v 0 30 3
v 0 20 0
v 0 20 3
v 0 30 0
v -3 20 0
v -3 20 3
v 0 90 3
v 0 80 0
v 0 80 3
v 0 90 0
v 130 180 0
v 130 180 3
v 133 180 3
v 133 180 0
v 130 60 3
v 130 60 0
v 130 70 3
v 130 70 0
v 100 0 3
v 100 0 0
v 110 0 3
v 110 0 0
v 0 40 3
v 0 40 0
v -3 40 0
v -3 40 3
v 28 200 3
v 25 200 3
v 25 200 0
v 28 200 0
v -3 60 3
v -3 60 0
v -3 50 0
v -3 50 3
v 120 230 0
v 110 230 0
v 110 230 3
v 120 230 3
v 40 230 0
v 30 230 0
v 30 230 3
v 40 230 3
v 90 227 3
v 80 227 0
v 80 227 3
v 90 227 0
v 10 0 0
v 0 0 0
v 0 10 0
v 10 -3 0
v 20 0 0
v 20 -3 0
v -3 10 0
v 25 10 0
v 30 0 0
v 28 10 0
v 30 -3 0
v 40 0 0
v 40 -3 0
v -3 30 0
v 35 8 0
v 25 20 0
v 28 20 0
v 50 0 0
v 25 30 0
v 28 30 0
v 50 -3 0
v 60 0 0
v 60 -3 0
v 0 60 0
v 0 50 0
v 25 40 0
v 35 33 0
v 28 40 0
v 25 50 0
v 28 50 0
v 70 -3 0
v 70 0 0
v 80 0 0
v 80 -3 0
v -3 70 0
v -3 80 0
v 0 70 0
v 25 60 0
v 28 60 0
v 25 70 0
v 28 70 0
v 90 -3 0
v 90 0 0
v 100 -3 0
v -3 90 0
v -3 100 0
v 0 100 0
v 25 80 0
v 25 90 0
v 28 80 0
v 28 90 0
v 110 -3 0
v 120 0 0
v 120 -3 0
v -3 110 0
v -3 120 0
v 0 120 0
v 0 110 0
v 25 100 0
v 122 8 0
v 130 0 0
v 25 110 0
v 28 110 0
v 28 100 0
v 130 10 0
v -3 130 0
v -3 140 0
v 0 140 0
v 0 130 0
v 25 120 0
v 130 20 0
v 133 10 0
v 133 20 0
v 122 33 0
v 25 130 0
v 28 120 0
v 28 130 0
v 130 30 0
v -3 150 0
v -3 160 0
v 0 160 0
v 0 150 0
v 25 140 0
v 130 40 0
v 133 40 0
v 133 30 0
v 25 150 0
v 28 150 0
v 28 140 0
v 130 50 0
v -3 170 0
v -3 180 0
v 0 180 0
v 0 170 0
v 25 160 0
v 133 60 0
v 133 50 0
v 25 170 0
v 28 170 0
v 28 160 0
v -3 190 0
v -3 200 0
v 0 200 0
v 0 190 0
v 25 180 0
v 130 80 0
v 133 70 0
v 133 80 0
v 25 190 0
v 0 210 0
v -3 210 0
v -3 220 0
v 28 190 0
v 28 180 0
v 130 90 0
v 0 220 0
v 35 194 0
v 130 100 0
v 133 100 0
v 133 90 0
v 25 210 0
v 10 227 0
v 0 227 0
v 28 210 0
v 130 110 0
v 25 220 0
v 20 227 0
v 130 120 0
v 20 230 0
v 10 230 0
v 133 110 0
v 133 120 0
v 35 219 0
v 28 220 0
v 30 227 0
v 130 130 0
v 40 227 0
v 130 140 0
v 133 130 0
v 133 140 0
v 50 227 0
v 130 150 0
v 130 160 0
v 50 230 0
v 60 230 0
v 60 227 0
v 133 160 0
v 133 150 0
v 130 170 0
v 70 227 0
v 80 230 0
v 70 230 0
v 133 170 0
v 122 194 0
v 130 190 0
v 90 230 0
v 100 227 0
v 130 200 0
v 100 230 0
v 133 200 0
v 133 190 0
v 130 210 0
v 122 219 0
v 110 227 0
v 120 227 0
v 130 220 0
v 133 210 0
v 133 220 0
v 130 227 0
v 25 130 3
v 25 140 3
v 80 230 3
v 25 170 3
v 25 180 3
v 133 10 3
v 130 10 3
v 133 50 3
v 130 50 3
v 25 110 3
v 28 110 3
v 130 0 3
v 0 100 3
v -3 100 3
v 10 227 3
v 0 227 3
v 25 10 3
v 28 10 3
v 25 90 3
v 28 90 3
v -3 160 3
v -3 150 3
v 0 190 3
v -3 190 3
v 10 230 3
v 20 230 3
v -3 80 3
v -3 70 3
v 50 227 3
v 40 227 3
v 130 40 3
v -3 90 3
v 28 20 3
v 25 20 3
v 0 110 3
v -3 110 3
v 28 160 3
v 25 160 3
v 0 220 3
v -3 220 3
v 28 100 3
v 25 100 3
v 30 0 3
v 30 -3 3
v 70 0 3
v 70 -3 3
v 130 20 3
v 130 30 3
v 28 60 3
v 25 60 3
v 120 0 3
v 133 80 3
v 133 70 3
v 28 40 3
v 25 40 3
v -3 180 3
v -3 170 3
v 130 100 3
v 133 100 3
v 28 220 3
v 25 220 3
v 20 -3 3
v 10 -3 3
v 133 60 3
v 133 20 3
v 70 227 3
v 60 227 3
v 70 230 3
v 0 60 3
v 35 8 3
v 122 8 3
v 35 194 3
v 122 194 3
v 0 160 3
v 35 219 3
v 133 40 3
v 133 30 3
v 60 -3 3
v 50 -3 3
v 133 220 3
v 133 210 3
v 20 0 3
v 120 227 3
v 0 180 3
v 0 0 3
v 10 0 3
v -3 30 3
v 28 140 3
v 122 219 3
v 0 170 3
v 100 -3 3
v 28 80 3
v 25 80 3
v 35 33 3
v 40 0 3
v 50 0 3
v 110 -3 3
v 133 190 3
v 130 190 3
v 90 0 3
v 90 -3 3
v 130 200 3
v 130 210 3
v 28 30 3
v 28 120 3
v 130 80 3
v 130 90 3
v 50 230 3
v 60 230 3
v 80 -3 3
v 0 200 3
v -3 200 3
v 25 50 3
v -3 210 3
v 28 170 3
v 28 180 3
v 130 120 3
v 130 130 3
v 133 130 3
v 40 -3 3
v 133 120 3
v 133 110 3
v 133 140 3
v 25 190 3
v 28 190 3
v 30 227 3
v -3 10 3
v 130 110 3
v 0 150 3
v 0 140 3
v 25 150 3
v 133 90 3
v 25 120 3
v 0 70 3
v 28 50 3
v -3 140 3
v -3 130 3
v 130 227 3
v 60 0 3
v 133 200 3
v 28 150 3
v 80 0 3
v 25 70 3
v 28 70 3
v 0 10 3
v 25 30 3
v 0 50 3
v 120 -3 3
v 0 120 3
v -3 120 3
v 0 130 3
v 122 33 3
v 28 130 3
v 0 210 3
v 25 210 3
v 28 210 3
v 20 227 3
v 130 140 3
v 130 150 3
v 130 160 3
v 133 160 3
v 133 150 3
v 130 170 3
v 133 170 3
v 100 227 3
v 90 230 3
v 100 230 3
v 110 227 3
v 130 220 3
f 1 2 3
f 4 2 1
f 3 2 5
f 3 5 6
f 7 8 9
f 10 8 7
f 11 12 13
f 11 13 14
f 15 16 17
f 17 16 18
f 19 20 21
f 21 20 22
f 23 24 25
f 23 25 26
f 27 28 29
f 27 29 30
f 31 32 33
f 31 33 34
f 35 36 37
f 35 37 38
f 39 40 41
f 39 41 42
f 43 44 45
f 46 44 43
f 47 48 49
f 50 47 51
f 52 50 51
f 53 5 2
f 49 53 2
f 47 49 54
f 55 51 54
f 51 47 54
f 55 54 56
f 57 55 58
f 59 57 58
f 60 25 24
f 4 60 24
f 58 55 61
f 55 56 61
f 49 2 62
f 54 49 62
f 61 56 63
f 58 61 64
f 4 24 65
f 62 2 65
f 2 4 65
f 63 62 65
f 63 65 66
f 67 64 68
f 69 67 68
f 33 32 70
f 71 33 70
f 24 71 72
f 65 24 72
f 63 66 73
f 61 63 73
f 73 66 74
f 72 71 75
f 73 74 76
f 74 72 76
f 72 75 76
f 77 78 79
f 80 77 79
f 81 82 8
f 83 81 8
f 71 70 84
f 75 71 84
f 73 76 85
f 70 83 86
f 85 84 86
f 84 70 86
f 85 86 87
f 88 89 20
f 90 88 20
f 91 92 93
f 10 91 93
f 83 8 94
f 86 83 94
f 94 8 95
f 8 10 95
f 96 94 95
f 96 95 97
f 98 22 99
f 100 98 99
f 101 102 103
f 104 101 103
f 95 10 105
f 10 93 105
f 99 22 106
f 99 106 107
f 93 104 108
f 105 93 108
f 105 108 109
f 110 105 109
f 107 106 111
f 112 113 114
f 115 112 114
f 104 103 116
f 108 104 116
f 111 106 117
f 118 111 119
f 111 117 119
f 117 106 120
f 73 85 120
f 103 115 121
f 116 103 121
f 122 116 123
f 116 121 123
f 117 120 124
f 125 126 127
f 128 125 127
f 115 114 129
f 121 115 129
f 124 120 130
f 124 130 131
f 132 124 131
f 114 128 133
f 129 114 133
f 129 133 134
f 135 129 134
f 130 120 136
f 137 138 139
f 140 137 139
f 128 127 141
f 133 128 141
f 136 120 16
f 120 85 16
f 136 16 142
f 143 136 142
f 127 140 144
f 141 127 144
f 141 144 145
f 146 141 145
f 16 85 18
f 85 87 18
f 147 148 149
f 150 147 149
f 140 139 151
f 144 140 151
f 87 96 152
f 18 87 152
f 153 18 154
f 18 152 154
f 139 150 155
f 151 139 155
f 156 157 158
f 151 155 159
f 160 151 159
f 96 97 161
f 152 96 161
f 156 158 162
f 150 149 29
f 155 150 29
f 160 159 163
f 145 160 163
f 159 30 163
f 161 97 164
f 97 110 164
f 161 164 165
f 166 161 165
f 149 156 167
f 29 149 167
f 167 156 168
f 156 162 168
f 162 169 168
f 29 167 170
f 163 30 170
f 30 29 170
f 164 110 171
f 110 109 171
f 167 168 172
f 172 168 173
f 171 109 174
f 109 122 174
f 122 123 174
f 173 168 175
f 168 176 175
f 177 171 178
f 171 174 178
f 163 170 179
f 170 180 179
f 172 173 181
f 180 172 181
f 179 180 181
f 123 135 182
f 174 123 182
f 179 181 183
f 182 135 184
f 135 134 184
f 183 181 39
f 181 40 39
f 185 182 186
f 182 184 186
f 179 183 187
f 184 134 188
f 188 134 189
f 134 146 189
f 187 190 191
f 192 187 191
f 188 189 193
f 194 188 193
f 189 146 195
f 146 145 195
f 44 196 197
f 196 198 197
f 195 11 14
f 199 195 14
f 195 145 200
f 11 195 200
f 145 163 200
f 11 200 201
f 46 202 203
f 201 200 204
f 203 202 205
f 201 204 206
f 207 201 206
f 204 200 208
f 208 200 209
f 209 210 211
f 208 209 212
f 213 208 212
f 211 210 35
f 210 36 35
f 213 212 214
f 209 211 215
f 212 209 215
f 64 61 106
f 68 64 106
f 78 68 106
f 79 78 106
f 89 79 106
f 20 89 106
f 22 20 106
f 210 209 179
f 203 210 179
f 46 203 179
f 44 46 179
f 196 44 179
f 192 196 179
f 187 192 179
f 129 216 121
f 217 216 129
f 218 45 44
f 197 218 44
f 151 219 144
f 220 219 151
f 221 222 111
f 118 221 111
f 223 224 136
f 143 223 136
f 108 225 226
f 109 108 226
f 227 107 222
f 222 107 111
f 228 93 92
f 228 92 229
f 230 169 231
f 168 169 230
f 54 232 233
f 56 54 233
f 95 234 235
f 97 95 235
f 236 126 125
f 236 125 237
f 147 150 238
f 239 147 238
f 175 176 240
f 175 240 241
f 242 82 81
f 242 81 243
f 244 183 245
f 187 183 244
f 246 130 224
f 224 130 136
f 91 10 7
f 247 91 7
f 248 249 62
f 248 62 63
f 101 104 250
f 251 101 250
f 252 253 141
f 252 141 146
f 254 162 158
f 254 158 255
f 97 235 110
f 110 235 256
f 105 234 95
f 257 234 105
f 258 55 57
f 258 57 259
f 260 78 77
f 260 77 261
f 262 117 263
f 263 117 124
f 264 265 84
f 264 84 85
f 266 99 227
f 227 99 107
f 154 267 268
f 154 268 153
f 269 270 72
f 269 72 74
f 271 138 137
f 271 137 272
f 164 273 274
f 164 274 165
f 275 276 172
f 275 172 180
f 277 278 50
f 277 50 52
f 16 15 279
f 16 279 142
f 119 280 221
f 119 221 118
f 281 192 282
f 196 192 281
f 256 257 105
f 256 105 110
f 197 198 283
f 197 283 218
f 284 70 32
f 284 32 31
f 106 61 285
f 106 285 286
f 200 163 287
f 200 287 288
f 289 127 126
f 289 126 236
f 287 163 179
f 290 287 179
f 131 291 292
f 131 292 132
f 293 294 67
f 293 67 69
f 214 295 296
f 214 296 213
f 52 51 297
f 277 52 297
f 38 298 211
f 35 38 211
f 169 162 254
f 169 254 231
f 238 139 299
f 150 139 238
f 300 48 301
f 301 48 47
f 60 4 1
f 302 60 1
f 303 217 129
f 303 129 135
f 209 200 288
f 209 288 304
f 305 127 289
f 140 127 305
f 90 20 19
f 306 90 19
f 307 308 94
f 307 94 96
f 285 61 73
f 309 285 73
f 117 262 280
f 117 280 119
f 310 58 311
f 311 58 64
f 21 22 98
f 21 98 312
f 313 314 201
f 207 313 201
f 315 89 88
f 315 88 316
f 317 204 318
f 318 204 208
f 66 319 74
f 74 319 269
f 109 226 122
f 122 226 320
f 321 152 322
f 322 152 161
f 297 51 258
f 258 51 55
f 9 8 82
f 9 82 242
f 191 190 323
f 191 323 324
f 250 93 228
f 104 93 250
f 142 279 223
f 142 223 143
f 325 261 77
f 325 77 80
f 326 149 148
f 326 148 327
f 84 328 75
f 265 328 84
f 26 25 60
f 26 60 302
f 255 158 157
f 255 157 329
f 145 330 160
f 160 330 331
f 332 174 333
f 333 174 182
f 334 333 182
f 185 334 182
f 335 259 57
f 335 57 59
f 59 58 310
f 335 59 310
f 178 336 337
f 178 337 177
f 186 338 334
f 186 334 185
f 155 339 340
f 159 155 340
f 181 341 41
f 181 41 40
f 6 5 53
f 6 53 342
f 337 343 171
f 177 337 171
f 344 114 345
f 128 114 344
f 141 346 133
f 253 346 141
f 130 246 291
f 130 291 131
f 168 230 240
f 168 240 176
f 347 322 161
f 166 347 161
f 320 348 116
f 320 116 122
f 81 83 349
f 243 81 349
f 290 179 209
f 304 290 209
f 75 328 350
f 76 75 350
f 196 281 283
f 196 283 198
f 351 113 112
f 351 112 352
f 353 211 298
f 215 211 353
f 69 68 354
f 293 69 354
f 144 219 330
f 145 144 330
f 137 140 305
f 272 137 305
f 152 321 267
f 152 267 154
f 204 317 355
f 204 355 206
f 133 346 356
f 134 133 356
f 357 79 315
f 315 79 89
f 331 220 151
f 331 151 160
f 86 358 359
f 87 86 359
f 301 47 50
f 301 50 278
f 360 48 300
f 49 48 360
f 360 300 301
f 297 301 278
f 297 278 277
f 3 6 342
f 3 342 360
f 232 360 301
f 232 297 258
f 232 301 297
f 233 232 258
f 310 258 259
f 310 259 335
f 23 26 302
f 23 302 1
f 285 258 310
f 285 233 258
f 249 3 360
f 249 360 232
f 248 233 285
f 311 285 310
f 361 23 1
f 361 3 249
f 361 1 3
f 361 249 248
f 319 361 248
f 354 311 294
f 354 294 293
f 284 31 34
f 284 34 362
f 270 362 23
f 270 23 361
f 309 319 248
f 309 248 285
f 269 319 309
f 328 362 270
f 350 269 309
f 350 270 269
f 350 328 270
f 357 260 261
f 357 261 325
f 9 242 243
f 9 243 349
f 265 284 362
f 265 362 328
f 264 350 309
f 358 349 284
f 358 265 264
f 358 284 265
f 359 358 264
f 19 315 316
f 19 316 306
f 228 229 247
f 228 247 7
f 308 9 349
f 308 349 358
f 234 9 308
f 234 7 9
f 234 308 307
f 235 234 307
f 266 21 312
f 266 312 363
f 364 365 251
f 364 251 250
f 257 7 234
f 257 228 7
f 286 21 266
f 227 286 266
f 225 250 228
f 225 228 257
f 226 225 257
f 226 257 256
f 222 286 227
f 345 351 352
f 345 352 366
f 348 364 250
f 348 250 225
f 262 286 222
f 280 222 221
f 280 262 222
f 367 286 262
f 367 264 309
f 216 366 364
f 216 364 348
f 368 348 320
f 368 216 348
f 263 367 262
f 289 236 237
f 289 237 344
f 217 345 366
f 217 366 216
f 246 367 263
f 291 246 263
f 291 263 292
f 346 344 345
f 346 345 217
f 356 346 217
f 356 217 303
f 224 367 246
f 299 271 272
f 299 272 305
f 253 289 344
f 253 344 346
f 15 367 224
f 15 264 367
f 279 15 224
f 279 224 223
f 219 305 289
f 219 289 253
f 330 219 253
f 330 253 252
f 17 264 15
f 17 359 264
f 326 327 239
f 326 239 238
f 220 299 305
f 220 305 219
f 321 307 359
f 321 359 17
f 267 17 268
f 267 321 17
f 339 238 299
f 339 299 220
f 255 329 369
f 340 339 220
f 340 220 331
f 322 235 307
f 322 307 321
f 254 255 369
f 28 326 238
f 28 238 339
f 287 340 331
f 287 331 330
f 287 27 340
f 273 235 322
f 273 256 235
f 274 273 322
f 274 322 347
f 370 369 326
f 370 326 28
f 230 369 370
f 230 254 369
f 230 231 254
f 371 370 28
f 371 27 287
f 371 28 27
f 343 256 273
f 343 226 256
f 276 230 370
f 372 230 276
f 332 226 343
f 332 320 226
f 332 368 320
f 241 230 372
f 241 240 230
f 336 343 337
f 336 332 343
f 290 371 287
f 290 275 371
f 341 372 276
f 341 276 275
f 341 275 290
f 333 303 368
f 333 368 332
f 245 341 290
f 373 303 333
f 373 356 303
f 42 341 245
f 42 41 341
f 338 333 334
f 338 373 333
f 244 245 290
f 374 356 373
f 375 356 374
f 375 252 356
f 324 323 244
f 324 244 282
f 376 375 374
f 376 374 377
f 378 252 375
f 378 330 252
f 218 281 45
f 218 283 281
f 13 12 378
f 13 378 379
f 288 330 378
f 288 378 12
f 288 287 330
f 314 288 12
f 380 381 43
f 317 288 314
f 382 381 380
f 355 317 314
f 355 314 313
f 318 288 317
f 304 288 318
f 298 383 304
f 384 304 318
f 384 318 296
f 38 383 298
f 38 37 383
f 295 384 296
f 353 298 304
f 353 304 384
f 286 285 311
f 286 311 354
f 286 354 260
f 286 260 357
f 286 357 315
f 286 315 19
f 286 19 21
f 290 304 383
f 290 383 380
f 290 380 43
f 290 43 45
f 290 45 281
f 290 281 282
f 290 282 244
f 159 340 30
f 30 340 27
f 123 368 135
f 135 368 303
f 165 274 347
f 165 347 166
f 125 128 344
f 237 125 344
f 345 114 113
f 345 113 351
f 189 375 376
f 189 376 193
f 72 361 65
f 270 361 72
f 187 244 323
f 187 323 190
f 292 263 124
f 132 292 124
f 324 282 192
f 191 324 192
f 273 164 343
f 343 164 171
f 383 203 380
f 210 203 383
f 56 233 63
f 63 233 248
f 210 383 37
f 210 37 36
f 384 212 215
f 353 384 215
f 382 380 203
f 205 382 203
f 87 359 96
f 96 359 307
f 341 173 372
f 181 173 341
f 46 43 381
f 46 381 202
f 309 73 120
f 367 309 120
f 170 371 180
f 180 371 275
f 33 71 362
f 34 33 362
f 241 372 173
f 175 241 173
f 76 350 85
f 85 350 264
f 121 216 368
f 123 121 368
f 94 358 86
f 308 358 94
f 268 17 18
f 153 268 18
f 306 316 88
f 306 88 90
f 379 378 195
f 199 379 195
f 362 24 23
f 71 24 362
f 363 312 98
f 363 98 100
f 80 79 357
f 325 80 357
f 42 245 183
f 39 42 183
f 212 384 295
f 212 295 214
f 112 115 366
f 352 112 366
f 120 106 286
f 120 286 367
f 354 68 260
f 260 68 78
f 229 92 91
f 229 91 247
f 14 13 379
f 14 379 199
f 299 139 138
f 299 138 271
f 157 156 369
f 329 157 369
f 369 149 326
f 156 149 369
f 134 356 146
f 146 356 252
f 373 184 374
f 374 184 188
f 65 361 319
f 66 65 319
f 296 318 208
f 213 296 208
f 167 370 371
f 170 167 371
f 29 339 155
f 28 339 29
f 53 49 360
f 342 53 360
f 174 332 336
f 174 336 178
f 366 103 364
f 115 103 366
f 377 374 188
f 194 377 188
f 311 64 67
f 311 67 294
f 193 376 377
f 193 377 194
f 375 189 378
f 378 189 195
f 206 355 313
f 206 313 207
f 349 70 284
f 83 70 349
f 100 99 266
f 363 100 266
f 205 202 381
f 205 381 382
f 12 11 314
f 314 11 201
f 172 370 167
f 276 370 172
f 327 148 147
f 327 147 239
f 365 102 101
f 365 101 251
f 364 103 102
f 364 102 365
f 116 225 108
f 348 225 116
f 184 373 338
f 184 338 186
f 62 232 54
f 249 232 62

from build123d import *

# Parameters (mm, degrees)
SKETCH1_W           = 130
SKETCH1_H           = 227
SKETCH1_W_2         = 87
SKETCH1_H_2         = 25
BOSS_EXTRUDE1_DEPTH = 3
SKETCH2_W           = 10
SKETCH2_H           = 3
BOSS_EXTRUDE2_DEPTH = 3
LPATTERN1_COUNT     = 6
LPATTERN1_PITCH     = 20
SKETCH3_W           = 10
SKETCH3_H           = 3
BOSS_EXTRUDE3_DEPTH = 3
LPATTERN2_COUNT     = 6
LPATTERN2_PITCH     = 20
SKETCH4_W           = 3
SKETCH4_H           = 10
BOSS_EXTRUDE4_DEPTH = 3
LPATTERN3_COUNT     = 11
LPATTERN3_PITCH     = 20
SKETCH5_W           = 3
SKETCH5_H           = 10
BOSS_EXTRUDE5_DEPTH = 3
LPATTERN4_COUNT     = 11
LPATTERN4_PITCH     = 20
SKETCH6_W           = 3
SKETCH6_H           = 10
CUT_EXTRUDE1_DEPTH  = 3
LPATTERN5_COUNT     = 11
LPATTERN5_PITCH     = 20


with BuildPart() as part:
    # Sketch1 → Boss-Extrude1 (new body)
    with BuildSketch(Plane.XY):
        with Locations((65, 113.5)):
            Rectangle(SKETCH1_W, SKETCH1_H)
        with Locations((78.5, 20.5)):
            Rectangle(SKETCH1_W_2, SKETCH1_H_2, mode=Mode.SUBTRACT)
        with Locations((78.5, 206.5)):
            Rectangle(SKETCH1_W_2, SKETCH1_H_2, mode=Mode.SUBTRACT)
    extrude(amount=BOSS_EXTRUDE1_DEPTH)

    # Sketch2 → Boss-Extrude2 (add)
    with BuildSketch(Plane.XZ):
        with Locations((15, 1.5)):
            Rectangle(SKETCH2_W, SKETCH2_H)
    boss_extrude2 = extrude(amount=BOSS_EXTRUDE2_DEPTH)

    # LPattern1: Boss-Extrude2 ×6
    with Locations(*[(i * LPATTERN1_PITCH, 0, 0) for i in range(1, LPATTERN1_COUNT)]):
        add(boss_extrude2)

    # Sketch3 → Boss-Extrude3 (add)
    with BuildSketch(Plane(origin=(0, 227, 0), x_dir=(1, 0, 0), z_dir=(0, 1, 0))):
        with Locations((15, -1.5)):
            Rectangle(SKETCH3_W, SKETCH3_H)
    boss_extrude3 = extrude(amount=BOSS_EXTRUDE3_DEPTH)

    # LPattern2: Boss-Extrude3 ×6
    with Locations(*[(i * LPATTERN2_PITCH, 0, 0) for i in range(1, LPATTERN2_COUNT)]):
        add(boss_extrude3)

    # Sketch4 → Boss-Extrude4 (add)
    with BuildSketch(Plane(origin=(130, 0, 0), x_dir=(0, 0, -1), z_dir=(1, 0, 0))):
        with Locations((-1.5, 15)):
            Rectangle(SKETCH4_W, SKETCH4_H)
    boss_extrude4 = extrude(amount=BOSS_EXTRUDE4_DEPTH)

    # LPattern3: Boss-Extrude4 ×11
    with Locations(*[(0, i * LPATTERN3_PITCH, 0) for i in range(1, LPATTERN3_COUNT)]):
        add(boss_extrude4)

    # Sketch5 → Boss-Extrude5 (add)
    with BuildSketch(Plane.ZY):
        with Locations((1.5, 15)):
            Rectangle(SKETCH5_W, SKETCH5_H)
    boss_extrude5 = extrude(amount=BOSS_EXTRUDE5_DEPTH)

    # LPattern4: Boss-Extrude5 ×11
    with Locations(*[(0, i * LPATTERN4_PITCH, 0) for i in range(1, LPATTERN4_COUNT)]):
        add(boss_extrude5)

    # Sketch6 → Cut-Extrude1 (cut)
    with BuildSketch(Plane.XY.offset(3)):
        with Locations((26.5, 15)):
            Rectangle(SKETCH6_W, SKETCH6_H)
    cut_extrude1 = extrude(amount=-CUT_EXTRUDE1_DEPTH, mode=Mode.SUBTRACT)

    # LPattern5: Cut-Extrude1 ×11
    with Locations(*[(0, i * LPATTERN5_PITCH, 0) for i in range(1, LPATTERN5_COUNT)]):
        add(cut_extrude1, mode=Mode.SUBTRACT)


solid = part.part
